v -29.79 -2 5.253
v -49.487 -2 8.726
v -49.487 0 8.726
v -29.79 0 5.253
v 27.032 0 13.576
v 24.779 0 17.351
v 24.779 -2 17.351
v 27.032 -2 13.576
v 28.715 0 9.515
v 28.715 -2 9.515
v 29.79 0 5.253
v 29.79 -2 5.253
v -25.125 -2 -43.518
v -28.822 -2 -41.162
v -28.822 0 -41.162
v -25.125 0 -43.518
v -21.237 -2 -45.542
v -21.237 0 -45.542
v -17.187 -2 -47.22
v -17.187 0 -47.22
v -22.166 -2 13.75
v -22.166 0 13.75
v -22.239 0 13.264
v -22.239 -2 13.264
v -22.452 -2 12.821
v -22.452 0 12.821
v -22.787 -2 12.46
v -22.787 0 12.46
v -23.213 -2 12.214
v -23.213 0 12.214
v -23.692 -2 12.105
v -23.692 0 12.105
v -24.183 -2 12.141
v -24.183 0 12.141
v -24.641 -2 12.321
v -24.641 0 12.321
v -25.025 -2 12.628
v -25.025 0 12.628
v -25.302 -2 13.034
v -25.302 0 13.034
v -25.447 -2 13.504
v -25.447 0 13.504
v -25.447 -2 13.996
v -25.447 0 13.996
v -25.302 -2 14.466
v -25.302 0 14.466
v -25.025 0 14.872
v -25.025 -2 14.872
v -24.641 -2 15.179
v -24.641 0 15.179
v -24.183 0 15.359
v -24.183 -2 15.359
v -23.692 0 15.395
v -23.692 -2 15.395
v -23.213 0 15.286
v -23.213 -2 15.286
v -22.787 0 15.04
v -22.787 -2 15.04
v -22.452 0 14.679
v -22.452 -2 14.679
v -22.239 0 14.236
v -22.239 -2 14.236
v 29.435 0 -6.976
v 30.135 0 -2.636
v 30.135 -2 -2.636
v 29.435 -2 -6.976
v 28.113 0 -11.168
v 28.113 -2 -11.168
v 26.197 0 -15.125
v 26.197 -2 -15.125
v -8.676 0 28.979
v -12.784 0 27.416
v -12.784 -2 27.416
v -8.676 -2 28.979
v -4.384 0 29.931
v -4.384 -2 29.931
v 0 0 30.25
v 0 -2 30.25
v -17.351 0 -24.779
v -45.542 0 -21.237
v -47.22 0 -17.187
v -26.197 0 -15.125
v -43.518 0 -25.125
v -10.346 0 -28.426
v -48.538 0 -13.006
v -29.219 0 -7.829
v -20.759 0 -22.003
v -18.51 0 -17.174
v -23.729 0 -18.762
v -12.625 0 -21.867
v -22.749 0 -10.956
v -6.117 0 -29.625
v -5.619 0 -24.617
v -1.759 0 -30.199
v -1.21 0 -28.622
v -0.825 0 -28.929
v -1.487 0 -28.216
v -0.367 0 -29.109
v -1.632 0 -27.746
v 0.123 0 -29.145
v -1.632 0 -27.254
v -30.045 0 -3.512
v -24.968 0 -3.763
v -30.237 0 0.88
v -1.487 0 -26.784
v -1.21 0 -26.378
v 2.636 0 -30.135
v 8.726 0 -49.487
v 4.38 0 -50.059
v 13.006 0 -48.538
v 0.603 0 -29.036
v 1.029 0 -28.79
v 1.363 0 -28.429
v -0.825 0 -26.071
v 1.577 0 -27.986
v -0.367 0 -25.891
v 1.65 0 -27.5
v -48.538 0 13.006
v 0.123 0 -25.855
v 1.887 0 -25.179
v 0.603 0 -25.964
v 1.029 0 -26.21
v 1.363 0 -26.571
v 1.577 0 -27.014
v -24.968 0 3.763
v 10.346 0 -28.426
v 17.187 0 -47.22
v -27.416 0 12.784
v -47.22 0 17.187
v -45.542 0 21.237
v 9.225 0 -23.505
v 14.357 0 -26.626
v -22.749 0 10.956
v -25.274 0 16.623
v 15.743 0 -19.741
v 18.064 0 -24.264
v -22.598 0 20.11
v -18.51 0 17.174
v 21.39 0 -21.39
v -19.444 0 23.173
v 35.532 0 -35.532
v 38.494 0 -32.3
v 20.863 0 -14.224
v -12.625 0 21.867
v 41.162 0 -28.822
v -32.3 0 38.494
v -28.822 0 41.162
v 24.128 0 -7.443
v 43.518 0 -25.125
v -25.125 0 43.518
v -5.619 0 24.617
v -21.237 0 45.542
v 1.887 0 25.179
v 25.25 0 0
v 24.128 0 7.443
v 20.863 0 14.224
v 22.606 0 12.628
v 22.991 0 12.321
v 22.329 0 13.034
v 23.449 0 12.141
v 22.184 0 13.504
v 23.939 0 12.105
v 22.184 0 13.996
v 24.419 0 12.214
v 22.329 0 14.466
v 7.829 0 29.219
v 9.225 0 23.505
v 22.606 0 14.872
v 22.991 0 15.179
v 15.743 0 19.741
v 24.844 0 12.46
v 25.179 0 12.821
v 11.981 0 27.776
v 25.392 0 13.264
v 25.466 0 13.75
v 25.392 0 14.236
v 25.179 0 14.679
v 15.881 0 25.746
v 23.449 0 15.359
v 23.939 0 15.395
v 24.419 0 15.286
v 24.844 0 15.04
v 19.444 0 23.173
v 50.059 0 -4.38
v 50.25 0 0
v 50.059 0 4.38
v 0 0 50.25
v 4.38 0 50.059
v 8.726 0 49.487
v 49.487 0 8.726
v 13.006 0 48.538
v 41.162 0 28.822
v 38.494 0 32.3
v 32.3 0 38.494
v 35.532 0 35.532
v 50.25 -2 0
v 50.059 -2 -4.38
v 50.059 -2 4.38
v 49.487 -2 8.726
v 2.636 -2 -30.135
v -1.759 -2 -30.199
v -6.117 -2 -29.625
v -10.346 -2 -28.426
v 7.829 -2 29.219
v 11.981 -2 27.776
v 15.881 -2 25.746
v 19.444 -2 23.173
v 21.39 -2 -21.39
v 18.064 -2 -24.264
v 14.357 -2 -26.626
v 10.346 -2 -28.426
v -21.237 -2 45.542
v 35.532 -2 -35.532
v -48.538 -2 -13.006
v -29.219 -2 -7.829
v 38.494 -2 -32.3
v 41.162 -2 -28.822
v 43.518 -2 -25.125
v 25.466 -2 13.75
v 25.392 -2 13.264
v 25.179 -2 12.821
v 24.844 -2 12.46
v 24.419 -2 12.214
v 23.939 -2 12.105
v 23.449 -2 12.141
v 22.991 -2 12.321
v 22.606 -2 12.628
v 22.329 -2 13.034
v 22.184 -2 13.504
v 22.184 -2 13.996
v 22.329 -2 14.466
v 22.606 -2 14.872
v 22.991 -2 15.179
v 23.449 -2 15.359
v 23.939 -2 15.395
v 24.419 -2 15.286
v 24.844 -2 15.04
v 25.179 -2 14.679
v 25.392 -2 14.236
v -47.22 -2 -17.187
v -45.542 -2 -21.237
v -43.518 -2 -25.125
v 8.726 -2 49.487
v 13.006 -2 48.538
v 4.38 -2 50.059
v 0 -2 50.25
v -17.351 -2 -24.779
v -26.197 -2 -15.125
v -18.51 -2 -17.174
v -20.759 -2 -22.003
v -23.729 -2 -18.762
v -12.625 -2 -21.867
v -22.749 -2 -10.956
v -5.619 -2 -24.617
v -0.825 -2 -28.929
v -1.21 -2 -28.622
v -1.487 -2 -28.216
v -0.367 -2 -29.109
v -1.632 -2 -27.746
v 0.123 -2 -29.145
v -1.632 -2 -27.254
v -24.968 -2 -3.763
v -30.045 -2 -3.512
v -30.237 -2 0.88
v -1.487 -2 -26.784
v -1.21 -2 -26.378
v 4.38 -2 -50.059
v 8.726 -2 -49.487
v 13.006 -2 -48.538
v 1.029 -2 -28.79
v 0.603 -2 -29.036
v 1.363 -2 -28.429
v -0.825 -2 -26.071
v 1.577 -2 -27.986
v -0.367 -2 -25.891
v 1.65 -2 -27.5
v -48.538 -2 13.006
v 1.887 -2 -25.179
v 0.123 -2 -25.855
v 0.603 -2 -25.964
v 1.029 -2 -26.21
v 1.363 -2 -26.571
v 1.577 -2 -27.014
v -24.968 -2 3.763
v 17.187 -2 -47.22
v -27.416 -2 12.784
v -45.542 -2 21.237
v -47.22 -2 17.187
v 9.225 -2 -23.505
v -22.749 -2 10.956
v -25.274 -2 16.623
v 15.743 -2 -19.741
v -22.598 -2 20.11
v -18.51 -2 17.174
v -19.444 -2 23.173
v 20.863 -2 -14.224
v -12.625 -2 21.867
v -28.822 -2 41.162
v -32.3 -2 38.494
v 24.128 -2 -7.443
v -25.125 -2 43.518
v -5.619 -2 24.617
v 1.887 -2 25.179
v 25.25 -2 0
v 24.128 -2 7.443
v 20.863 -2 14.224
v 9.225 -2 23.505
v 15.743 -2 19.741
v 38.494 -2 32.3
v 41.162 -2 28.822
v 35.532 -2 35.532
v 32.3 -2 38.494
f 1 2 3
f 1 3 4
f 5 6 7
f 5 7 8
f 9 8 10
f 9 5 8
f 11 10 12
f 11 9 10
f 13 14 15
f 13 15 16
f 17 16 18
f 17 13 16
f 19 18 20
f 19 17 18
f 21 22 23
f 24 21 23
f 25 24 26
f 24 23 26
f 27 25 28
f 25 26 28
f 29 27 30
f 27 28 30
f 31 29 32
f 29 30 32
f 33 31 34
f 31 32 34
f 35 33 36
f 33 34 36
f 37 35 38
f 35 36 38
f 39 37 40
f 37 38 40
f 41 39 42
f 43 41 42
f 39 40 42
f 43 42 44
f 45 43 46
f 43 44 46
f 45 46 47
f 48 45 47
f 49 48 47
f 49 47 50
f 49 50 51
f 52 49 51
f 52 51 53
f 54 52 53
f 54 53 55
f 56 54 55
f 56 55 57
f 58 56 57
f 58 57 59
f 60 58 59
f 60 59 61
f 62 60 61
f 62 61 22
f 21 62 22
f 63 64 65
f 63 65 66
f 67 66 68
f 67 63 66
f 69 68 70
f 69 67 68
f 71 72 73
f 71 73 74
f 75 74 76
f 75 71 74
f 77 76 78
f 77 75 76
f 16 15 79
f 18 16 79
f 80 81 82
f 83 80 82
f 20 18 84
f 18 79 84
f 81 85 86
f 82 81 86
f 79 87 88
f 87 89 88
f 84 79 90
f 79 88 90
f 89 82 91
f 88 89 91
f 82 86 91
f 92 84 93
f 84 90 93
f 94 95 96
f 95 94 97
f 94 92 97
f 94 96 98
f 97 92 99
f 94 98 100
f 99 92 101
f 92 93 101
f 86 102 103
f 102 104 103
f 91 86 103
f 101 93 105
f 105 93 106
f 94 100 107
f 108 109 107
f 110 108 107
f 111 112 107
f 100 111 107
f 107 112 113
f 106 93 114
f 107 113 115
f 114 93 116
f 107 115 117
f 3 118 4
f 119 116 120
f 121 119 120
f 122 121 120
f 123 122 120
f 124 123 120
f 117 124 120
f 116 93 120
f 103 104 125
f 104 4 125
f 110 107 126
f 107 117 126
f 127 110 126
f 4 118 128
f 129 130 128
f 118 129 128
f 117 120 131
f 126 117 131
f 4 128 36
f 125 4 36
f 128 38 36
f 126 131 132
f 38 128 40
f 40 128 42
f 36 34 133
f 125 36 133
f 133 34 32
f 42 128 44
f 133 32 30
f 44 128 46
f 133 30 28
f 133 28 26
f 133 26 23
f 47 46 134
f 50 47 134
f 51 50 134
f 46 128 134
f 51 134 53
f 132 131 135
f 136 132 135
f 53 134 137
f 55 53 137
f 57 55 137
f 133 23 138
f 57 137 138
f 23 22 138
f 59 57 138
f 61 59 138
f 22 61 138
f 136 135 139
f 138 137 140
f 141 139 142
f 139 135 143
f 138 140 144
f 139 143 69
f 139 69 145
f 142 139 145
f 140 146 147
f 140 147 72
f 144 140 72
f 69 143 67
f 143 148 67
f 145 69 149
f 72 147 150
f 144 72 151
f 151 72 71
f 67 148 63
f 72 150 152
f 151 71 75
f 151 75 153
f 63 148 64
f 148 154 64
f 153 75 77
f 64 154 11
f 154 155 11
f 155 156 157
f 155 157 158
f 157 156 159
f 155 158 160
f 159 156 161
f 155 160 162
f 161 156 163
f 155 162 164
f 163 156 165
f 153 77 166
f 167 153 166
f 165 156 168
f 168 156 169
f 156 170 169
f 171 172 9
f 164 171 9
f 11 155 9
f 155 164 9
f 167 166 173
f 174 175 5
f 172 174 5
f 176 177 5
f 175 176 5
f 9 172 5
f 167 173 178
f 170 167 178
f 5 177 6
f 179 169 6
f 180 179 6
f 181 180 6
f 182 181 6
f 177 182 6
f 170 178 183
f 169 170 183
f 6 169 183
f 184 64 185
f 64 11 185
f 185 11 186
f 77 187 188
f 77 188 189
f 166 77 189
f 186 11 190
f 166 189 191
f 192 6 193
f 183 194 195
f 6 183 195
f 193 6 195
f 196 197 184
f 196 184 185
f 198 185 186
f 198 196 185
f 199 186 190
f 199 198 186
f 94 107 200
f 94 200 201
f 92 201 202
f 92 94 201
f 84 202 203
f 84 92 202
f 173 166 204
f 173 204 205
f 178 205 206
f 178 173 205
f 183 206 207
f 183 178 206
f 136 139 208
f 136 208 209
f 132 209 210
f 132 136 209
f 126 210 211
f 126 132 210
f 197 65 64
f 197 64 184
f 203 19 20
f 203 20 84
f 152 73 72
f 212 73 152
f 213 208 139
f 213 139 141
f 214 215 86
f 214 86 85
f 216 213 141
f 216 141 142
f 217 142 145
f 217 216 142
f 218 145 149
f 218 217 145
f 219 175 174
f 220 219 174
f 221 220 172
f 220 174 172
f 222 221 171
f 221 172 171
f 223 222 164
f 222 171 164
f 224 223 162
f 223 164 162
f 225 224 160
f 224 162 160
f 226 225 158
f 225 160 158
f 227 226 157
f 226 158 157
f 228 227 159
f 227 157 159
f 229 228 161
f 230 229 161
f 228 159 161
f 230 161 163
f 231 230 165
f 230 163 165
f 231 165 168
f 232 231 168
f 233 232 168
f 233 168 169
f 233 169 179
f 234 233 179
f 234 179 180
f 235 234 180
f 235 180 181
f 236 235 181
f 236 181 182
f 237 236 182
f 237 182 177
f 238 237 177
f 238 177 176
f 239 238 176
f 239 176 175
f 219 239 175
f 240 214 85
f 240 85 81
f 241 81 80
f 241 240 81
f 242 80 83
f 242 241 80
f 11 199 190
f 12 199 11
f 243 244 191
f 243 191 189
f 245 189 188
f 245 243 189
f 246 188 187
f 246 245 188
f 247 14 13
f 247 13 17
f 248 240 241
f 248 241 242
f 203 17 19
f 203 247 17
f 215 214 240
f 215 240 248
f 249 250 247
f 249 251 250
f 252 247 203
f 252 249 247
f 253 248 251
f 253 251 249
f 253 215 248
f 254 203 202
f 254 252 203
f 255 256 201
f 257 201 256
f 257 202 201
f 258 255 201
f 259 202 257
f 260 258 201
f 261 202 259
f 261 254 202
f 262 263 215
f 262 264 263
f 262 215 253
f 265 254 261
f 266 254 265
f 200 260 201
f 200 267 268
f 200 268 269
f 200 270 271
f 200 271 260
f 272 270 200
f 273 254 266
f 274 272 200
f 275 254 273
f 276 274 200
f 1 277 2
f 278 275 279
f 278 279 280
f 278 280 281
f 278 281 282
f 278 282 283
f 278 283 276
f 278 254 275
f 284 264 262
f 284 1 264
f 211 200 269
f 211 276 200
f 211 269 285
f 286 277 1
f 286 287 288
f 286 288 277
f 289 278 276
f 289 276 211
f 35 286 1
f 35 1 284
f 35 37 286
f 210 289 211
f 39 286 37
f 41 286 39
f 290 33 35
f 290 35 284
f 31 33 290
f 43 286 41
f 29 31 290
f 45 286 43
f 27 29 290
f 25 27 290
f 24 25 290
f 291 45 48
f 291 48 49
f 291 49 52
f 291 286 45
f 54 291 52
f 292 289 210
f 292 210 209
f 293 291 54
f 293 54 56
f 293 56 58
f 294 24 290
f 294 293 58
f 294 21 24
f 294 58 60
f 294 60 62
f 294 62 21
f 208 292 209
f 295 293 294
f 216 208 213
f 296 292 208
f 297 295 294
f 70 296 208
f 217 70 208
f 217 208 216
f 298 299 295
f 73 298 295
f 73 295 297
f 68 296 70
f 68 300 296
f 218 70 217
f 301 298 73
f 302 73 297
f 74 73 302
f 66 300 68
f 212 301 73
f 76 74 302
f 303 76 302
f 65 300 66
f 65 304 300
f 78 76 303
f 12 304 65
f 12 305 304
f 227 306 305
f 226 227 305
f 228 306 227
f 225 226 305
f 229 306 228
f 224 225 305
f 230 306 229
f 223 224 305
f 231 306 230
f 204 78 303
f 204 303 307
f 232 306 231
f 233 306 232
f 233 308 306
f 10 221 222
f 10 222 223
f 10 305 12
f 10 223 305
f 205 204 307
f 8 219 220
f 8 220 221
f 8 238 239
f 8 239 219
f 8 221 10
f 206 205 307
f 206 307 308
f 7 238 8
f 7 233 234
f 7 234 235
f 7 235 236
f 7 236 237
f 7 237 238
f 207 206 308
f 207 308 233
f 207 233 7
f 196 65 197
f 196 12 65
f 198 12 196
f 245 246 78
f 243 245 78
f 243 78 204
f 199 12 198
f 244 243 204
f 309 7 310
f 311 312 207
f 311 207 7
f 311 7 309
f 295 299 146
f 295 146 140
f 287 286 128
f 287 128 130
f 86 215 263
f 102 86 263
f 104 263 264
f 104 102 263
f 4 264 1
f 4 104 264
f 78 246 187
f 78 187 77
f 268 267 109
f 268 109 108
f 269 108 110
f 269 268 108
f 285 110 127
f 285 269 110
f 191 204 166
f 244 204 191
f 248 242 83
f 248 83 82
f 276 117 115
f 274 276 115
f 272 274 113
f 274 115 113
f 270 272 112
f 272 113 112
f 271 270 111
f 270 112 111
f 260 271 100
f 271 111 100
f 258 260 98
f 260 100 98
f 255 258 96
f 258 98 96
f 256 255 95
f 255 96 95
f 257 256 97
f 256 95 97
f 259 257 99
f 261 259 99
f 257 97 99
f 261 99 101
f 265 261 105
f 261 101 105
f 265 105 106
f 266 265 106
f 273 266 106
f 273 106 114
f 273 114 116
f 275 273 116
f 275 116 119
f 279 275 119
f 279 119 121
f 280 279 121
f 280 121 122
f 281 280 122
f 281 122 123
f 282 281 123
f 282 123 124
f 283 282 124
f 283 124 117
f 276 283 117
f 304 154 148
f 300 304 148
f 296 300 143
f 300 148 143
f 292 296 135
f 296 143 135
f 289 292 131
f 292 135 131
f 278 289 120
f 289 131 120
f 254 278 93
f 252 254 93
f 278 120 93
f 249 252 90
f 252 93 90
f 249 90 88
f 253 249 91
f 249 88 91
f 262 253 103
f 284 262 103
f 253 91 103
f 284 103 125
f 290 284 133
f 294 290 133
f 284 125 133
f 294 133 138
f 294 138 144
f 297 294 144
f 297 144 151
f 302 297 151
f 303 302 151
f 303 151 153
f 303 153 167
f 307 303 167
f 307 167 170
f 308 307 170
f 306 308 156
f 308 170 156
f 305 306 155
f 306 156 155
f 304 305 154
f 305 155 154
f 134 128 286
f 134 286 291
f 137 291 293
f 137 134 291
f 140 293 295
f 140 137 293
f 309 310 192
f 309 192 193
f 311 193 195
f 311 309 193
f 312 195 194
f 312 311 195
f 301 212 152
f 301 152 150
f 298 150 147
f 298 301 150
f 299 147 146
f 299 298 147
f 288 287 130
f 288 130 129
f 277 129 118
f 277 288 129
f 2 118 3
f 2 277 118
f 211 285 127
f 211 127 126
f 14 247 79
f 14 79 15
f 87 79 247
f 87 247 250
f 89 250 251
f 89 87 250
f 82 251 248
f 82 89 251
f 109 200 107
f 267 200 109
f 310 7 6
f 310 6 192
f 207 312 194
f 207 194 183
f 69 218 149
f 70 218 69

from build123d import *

# Parameters (mm, degrees)
SKETCH1_R           = 30.25
SKETCH1_R_2         = 25.25
EXTRUDE_THIN1_DEPTH = 2
SKETCH2_R           = 1.65
CUT_EXTRUDE3_DEPTH  = 10
BOSS_EXTRUDE1_DEPTH = 2


with BuildPart() as part:
    # Sketch1 → Extrude-Thin1 (new body)
    with BuildSketch(Plane(origin=(0, 0, 0), x_dir=(1, 0, 0), z_dir=(0, 1, 0))):
        Circle(SKETCH1_R)
        Circle(SKETCH1_R_2, mode=Mode.SUBTRACT)
    extrude(amount=-EXTRUDE_THIN1_DEPTH)

    # Sketch2 → Cut-Extrude3 (cut)
    with BuildSketch(Plane(origin=(0, 0, 0), x_dir=(1, 0, 0), z_dir=(0, 1, 0))):
        with Locations((0, 27.5)):
            Circle(SKETCH2_R)
        with Locations((23.815698604, -13.75)):
            Circle(SKETCH2_R)
        with Locations((-23.815698604, -13.75)):
            Circle(SKETCH2_R)
    extrude(amount=-CUT_EXTRUDE3_DEPTH, mode=Mode.SUBTRACT)

    # Sketch5 → Boss-Extrude1 (add)
    with BuildSketch(Plane.XZ.offset(2)):
        with BuildLine():
            Line((0, 50.25), (0, 30.25))
            ThreePointArc((0, 30.25), (3.948417315, 29.991207057), (7.829276114, 29.219256245))
            Line((7.829276114, 29.219256245), (13.005657016, 48.537772771))
            ThreePointArc((13.005657016, 48.537772771), (6.558941159, 49.820104284), (0, 50.25))
        make_face()
        with BuildLine():
            Line((32.300077387, 38.493733267), (19.444325193, 23.172844404))
            ThreePointArc((19.444325193, 23.172844404), (22.302639439, 20.43660378), (24.77934934, 17.3506872))
            Line((24.77934934, 17.3506872), (41.162390226, 28.822215927))
            ThreePointArc((41.162390226, 28.822215927), (37.048186175, 33.948407933), (32.300077387, 38.493733267))
        make_face()
        with BuildLine():
            Line((49.486589589, 8.725820928), (29.790434529, 5.252857374))
            ThreePointArc((29.790434529, 5.252857374), (30.221208703, 1.319486468), (30.134889617, -2.636461218))
            Line((30.134889617, -2.636461218), (50.058783579, -4.379576073))
            ThreePointArc((50.058783579, -4.379576073), (50.202173134, 2.191874215), (49.486589589, 8.725820928))
        make_face()
        with BuildLine():
            Line((43.51777654, -25.125), (26.197268464, -15.125))
            ThreePointArc((26.197268464, -15.125), (23.998938544, -18.415033228), (21.389980131, -21.389980131))
            Line((21.389980131, -21.389980131), (35.532115755, -35.532115755))
            ThreePointArc((35.532115755, -35.532115755), (39.86600535, -30.590261808), (43.51777654, -25.125))
        make_face()
        with BuildLine():
            Line((17.186512202, -47.219554194), (10.346109336, -28.425701779))
            ThreePointArc((10.346109336, -28.425701779), (6.547298322, -29.532954215), (2.636461218, -30.134889617))
            Line((2.636461218, -30.134889617), (4.379576073, -50.058783579))
            ThreePointArc((4.379576073, -50.058783579), (10.8760906, -49.058874358), (17.186512202, -47.219554194))
        make_face()
        with BuildLine():
            Line((-17.186512202, -47.219554194), (-10.346109336, -28.425701779))
            ThreePointArc((-10.346109336, -28.425701779), (-13.96789555, -26.832077704), (-17.3506872, -24.77934934))
            Line((-17.3506872, -24.77934934), (-28.822215927, -41.162390226))
            ThreePointArc((-28.822215927, -41.162390226), (-23.202867815, -44.572294367), (-17.186512202, -47.219554194))
        make_face()
        with BuildLine():
            Line((-43.51777654, -25.125), (-26.197268464, -15.125))
            ThreePointArc((-26.197268464, -15.125), (-27.947355858, -11.576173829), (-29.219256245, -7.829276114))
            Line((-29.219256245, -7.829276114), (-48.537772771, -13.005657016))
            ThreePointArc((-48.537772771, -13.005657016), (-46.424946509, -19.229842476), (-43.51777654, -25.125))
        make_face()
        with BuildLine():
            Line((-49.486589589, 8.725820928), (-29.790434529, 5.252857374))
            ThreePointArc((-29.790434529, 5.252857374), (-28.84993776, 9.096350435), (-27.415810558, 12.784202418))
            Line((-27.415810558, 12.784202418), (-45.541966299, 21.236567652))
            ThreePointArc((-45.541966299, 21.236567652), (-47.924276775, 15.110466425), (-49.486589589, 8.725820928))
        make_face()
        with BuildLine():
            Line((-32.300077387, 38.493733267), (-19.444325193, 23.172844404))
            ThreePointArc((-19.444325193, 23.172844404), (-16.253313152, 25.512591236), (-12.784202418, 27.415810558))
            Line((-12.784202418, 27.415810558), (-21.236567652, 45.541966299))
            ThreePointArc((-21.236567652, 45.541966299), (-26.999305319, 42.380420152), (-32.300077387, 38.493733267))
        make_face()
    extrude(amount=-BOSS_EXTRUDE1_DEPTH)


solid = part.part
